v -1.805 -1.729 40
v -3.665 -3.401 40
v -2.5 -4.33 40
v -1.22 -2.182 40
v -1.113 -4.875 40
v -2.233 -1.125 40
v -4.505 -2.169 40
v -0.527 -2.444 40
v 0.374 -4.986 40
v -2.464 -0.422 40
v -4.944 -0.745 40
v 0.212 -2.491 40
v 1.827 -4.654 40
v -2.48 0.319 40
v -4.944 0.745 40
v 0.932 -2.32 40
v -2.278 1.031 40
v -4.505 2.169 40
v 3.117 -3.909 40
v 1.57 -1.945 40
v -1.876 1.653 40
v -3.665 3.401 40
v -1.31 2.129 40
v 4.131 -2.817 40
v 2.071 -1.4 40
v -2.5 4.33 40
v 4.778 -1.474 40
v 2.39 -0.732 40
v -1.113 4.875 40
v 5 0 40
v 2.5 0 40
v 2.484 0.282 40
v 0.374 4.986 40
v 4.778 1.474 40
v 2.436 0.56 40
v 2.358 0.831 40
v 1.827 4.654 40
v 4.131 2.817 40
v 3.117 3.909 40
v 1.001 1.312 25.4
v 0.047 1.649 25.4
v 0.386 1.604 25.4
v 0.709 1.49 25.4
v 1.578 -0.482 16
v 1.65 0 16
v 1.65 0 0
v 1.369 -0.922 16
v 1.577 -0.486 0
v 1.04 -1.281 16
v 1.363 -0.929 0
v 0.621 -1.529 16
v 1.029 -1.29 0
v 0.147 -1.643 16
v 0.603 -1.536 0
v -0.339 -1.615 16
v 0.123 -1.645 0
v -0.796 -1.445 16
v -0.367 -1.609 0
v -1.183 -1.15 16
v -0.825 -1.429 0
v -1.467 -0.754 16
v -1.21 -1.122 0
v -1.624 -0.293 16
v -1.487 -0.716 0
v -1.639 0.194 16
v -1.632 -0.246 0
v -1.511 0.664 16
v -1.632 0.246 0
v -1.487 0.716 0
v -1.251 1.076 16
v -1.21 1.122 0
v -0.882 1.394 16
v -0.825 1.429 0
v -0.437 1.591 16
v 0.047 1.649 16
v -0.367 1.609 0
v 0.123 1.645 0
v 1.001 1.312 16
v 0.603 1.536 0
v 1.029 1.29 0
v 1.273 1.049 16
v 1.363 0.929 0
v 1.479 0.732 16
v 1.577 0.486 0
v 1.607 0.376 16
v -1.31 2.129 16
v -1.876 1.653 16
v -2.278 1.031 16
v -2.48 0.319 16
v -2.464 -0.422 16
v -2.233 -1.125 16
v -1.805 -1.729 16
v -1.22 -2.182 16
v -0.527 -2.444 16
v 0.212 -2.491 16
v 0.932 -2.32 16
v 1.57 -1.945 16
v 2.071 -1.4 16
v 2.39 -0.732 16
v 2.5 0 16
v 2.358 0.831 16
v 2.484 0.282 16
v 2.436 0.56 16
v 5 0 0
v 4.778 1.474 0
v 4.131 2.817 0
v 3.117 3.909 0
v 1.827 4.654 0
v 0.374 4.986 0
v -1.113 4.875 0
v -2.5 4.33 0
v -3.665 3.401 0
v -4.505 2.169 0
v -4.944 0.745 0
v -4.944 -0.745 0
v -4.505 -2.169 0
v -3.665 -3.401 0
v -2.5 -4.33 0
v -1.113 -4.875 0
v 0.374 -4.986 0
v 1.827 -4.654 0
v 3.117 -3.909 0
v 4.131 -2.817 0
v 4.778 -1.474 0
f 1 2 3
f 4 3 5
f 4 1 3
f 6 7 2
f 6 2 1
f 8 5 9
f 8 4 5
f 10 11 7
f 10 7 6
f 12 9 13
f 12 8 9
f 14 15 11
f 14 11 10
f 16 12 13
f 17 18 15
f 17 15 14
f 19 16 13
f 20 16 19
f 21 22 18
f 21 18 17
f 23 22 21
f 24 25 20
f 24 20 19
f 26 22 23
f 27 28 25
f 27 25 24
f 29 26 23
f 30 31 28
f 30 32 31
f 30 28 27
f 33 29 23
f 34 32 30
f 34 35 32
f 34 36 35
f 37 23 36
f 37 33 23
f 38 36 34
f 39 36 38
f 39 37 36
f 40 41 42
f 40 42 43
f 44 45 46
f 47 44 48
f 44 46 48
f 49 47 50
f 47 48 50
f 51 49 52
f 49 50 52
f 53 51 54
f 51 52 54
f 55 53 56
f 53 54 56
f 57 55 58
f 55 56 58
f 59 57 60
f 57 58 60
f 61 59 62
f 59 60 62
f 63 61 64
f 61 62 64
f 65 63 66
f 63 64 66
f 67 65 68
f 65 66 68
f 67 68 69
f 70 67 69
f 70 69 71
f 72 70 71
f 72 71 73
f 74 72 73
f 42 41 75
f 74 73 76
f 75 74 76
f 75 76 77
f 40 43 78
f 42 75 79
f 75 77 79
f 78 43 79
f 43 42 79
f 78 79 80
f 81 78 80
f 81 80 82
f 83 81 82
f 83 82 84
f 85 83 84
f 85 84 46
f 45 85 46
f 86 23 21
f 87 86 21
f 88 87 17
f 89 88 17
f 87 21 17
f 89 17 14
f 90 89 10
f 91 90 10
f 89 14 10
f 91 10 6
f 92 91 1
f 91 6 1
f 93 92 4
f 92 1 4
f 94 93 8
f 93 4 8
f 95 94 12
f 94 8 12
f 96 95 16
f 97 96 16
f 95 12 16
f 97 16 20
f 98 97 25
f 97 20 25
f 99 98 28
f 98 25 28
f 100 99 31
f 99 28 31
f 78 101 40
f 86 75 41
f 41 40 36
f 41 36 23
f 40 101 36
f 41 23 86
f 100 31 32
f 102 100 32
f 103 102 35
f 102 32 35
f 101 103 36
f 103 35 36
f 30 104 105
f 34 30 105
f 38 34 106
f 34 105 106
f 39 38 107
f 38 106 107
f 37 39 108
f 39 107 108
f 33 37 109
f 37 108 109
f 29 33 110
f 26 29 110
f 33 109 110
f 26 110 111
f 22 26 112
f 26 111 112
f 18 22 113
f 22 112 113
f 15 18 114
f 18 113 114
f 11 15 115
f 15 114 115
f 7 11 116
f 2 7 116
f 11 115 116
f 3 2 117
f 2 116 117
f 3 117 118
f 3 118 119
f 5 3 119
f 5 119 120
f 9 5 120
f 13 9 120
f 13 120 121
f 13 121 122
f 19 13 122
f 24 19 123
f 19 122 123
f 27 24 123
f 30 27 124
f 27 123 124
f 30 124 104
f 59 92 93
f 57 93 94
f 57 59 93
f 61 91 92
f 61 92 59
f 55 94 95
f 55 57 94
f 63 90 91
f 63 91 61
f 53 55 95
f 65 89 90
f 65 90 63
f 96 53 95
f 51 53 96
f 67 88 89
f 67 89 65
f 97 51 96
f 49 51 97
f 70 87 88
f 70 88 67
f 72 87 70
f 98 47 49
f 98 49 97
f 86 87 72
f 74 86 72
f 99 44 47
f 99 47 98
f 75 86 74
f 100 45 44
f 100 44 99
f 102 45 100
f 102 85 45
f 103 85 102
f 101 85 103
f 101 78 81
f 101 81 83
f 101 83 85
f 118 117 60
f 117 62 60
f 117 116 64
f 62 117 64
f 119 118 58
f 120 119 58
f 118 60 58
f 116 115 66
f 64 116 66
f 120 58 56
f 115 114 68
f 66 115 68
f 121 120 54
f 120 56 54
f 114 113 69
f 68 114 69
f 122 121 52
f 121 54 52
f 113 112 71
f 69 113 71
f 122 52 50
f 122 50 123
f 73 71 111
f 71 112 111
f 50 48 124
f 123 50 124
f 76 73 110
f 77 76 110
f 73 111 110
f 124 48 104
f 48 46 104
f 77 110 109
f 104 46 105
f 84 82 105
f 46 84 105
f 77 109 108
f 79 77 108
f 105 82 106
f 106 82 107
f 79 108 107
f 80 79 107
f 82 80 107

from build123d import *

# Parameters (mm, degrees)
F0_R     = 5
F1_DEPTH = 40
F3_DEPTH = 24
F4_R     = 1.65
F5_DEPTH = 25.4


with BuildPart() as f1:
    # F0 (on Top) → F1 (new body)
    with BuildSketch(Plane.XY):
        Circle(F0_R)
    extrude(amount=F1_DEPTH)

    # F2 (on face) → F3 (cut)
    with BuildSketch(Plane.XY.offset(40)):
        with BuildLine():
            ThreePointArc((-1.309686, 2.129489), (-1.219792, -2.182225), (2.5, 0))
            ThreePointArc((2.5, 0), (2.464167, 0.421758), (2.357696, 0.831425))
            Line((2.357696, 0.831425), (-1.309686, 2.129489))
        make_face()
    extrude(amount=-F3_DEPTH, mode=Mode.SUBTRACT)

    # F4 (on face) → F5 (cut)
    with BuildSketch(Plane(origin=(0, 0, 0), x_dir=(1, 0, 0), z_dir=(0, 0, -1))):
        Circle(F4_R)
    extrude(amount=-F5_DEPTH, mode=Mode.SUBTRACT)


solid = f1.part
